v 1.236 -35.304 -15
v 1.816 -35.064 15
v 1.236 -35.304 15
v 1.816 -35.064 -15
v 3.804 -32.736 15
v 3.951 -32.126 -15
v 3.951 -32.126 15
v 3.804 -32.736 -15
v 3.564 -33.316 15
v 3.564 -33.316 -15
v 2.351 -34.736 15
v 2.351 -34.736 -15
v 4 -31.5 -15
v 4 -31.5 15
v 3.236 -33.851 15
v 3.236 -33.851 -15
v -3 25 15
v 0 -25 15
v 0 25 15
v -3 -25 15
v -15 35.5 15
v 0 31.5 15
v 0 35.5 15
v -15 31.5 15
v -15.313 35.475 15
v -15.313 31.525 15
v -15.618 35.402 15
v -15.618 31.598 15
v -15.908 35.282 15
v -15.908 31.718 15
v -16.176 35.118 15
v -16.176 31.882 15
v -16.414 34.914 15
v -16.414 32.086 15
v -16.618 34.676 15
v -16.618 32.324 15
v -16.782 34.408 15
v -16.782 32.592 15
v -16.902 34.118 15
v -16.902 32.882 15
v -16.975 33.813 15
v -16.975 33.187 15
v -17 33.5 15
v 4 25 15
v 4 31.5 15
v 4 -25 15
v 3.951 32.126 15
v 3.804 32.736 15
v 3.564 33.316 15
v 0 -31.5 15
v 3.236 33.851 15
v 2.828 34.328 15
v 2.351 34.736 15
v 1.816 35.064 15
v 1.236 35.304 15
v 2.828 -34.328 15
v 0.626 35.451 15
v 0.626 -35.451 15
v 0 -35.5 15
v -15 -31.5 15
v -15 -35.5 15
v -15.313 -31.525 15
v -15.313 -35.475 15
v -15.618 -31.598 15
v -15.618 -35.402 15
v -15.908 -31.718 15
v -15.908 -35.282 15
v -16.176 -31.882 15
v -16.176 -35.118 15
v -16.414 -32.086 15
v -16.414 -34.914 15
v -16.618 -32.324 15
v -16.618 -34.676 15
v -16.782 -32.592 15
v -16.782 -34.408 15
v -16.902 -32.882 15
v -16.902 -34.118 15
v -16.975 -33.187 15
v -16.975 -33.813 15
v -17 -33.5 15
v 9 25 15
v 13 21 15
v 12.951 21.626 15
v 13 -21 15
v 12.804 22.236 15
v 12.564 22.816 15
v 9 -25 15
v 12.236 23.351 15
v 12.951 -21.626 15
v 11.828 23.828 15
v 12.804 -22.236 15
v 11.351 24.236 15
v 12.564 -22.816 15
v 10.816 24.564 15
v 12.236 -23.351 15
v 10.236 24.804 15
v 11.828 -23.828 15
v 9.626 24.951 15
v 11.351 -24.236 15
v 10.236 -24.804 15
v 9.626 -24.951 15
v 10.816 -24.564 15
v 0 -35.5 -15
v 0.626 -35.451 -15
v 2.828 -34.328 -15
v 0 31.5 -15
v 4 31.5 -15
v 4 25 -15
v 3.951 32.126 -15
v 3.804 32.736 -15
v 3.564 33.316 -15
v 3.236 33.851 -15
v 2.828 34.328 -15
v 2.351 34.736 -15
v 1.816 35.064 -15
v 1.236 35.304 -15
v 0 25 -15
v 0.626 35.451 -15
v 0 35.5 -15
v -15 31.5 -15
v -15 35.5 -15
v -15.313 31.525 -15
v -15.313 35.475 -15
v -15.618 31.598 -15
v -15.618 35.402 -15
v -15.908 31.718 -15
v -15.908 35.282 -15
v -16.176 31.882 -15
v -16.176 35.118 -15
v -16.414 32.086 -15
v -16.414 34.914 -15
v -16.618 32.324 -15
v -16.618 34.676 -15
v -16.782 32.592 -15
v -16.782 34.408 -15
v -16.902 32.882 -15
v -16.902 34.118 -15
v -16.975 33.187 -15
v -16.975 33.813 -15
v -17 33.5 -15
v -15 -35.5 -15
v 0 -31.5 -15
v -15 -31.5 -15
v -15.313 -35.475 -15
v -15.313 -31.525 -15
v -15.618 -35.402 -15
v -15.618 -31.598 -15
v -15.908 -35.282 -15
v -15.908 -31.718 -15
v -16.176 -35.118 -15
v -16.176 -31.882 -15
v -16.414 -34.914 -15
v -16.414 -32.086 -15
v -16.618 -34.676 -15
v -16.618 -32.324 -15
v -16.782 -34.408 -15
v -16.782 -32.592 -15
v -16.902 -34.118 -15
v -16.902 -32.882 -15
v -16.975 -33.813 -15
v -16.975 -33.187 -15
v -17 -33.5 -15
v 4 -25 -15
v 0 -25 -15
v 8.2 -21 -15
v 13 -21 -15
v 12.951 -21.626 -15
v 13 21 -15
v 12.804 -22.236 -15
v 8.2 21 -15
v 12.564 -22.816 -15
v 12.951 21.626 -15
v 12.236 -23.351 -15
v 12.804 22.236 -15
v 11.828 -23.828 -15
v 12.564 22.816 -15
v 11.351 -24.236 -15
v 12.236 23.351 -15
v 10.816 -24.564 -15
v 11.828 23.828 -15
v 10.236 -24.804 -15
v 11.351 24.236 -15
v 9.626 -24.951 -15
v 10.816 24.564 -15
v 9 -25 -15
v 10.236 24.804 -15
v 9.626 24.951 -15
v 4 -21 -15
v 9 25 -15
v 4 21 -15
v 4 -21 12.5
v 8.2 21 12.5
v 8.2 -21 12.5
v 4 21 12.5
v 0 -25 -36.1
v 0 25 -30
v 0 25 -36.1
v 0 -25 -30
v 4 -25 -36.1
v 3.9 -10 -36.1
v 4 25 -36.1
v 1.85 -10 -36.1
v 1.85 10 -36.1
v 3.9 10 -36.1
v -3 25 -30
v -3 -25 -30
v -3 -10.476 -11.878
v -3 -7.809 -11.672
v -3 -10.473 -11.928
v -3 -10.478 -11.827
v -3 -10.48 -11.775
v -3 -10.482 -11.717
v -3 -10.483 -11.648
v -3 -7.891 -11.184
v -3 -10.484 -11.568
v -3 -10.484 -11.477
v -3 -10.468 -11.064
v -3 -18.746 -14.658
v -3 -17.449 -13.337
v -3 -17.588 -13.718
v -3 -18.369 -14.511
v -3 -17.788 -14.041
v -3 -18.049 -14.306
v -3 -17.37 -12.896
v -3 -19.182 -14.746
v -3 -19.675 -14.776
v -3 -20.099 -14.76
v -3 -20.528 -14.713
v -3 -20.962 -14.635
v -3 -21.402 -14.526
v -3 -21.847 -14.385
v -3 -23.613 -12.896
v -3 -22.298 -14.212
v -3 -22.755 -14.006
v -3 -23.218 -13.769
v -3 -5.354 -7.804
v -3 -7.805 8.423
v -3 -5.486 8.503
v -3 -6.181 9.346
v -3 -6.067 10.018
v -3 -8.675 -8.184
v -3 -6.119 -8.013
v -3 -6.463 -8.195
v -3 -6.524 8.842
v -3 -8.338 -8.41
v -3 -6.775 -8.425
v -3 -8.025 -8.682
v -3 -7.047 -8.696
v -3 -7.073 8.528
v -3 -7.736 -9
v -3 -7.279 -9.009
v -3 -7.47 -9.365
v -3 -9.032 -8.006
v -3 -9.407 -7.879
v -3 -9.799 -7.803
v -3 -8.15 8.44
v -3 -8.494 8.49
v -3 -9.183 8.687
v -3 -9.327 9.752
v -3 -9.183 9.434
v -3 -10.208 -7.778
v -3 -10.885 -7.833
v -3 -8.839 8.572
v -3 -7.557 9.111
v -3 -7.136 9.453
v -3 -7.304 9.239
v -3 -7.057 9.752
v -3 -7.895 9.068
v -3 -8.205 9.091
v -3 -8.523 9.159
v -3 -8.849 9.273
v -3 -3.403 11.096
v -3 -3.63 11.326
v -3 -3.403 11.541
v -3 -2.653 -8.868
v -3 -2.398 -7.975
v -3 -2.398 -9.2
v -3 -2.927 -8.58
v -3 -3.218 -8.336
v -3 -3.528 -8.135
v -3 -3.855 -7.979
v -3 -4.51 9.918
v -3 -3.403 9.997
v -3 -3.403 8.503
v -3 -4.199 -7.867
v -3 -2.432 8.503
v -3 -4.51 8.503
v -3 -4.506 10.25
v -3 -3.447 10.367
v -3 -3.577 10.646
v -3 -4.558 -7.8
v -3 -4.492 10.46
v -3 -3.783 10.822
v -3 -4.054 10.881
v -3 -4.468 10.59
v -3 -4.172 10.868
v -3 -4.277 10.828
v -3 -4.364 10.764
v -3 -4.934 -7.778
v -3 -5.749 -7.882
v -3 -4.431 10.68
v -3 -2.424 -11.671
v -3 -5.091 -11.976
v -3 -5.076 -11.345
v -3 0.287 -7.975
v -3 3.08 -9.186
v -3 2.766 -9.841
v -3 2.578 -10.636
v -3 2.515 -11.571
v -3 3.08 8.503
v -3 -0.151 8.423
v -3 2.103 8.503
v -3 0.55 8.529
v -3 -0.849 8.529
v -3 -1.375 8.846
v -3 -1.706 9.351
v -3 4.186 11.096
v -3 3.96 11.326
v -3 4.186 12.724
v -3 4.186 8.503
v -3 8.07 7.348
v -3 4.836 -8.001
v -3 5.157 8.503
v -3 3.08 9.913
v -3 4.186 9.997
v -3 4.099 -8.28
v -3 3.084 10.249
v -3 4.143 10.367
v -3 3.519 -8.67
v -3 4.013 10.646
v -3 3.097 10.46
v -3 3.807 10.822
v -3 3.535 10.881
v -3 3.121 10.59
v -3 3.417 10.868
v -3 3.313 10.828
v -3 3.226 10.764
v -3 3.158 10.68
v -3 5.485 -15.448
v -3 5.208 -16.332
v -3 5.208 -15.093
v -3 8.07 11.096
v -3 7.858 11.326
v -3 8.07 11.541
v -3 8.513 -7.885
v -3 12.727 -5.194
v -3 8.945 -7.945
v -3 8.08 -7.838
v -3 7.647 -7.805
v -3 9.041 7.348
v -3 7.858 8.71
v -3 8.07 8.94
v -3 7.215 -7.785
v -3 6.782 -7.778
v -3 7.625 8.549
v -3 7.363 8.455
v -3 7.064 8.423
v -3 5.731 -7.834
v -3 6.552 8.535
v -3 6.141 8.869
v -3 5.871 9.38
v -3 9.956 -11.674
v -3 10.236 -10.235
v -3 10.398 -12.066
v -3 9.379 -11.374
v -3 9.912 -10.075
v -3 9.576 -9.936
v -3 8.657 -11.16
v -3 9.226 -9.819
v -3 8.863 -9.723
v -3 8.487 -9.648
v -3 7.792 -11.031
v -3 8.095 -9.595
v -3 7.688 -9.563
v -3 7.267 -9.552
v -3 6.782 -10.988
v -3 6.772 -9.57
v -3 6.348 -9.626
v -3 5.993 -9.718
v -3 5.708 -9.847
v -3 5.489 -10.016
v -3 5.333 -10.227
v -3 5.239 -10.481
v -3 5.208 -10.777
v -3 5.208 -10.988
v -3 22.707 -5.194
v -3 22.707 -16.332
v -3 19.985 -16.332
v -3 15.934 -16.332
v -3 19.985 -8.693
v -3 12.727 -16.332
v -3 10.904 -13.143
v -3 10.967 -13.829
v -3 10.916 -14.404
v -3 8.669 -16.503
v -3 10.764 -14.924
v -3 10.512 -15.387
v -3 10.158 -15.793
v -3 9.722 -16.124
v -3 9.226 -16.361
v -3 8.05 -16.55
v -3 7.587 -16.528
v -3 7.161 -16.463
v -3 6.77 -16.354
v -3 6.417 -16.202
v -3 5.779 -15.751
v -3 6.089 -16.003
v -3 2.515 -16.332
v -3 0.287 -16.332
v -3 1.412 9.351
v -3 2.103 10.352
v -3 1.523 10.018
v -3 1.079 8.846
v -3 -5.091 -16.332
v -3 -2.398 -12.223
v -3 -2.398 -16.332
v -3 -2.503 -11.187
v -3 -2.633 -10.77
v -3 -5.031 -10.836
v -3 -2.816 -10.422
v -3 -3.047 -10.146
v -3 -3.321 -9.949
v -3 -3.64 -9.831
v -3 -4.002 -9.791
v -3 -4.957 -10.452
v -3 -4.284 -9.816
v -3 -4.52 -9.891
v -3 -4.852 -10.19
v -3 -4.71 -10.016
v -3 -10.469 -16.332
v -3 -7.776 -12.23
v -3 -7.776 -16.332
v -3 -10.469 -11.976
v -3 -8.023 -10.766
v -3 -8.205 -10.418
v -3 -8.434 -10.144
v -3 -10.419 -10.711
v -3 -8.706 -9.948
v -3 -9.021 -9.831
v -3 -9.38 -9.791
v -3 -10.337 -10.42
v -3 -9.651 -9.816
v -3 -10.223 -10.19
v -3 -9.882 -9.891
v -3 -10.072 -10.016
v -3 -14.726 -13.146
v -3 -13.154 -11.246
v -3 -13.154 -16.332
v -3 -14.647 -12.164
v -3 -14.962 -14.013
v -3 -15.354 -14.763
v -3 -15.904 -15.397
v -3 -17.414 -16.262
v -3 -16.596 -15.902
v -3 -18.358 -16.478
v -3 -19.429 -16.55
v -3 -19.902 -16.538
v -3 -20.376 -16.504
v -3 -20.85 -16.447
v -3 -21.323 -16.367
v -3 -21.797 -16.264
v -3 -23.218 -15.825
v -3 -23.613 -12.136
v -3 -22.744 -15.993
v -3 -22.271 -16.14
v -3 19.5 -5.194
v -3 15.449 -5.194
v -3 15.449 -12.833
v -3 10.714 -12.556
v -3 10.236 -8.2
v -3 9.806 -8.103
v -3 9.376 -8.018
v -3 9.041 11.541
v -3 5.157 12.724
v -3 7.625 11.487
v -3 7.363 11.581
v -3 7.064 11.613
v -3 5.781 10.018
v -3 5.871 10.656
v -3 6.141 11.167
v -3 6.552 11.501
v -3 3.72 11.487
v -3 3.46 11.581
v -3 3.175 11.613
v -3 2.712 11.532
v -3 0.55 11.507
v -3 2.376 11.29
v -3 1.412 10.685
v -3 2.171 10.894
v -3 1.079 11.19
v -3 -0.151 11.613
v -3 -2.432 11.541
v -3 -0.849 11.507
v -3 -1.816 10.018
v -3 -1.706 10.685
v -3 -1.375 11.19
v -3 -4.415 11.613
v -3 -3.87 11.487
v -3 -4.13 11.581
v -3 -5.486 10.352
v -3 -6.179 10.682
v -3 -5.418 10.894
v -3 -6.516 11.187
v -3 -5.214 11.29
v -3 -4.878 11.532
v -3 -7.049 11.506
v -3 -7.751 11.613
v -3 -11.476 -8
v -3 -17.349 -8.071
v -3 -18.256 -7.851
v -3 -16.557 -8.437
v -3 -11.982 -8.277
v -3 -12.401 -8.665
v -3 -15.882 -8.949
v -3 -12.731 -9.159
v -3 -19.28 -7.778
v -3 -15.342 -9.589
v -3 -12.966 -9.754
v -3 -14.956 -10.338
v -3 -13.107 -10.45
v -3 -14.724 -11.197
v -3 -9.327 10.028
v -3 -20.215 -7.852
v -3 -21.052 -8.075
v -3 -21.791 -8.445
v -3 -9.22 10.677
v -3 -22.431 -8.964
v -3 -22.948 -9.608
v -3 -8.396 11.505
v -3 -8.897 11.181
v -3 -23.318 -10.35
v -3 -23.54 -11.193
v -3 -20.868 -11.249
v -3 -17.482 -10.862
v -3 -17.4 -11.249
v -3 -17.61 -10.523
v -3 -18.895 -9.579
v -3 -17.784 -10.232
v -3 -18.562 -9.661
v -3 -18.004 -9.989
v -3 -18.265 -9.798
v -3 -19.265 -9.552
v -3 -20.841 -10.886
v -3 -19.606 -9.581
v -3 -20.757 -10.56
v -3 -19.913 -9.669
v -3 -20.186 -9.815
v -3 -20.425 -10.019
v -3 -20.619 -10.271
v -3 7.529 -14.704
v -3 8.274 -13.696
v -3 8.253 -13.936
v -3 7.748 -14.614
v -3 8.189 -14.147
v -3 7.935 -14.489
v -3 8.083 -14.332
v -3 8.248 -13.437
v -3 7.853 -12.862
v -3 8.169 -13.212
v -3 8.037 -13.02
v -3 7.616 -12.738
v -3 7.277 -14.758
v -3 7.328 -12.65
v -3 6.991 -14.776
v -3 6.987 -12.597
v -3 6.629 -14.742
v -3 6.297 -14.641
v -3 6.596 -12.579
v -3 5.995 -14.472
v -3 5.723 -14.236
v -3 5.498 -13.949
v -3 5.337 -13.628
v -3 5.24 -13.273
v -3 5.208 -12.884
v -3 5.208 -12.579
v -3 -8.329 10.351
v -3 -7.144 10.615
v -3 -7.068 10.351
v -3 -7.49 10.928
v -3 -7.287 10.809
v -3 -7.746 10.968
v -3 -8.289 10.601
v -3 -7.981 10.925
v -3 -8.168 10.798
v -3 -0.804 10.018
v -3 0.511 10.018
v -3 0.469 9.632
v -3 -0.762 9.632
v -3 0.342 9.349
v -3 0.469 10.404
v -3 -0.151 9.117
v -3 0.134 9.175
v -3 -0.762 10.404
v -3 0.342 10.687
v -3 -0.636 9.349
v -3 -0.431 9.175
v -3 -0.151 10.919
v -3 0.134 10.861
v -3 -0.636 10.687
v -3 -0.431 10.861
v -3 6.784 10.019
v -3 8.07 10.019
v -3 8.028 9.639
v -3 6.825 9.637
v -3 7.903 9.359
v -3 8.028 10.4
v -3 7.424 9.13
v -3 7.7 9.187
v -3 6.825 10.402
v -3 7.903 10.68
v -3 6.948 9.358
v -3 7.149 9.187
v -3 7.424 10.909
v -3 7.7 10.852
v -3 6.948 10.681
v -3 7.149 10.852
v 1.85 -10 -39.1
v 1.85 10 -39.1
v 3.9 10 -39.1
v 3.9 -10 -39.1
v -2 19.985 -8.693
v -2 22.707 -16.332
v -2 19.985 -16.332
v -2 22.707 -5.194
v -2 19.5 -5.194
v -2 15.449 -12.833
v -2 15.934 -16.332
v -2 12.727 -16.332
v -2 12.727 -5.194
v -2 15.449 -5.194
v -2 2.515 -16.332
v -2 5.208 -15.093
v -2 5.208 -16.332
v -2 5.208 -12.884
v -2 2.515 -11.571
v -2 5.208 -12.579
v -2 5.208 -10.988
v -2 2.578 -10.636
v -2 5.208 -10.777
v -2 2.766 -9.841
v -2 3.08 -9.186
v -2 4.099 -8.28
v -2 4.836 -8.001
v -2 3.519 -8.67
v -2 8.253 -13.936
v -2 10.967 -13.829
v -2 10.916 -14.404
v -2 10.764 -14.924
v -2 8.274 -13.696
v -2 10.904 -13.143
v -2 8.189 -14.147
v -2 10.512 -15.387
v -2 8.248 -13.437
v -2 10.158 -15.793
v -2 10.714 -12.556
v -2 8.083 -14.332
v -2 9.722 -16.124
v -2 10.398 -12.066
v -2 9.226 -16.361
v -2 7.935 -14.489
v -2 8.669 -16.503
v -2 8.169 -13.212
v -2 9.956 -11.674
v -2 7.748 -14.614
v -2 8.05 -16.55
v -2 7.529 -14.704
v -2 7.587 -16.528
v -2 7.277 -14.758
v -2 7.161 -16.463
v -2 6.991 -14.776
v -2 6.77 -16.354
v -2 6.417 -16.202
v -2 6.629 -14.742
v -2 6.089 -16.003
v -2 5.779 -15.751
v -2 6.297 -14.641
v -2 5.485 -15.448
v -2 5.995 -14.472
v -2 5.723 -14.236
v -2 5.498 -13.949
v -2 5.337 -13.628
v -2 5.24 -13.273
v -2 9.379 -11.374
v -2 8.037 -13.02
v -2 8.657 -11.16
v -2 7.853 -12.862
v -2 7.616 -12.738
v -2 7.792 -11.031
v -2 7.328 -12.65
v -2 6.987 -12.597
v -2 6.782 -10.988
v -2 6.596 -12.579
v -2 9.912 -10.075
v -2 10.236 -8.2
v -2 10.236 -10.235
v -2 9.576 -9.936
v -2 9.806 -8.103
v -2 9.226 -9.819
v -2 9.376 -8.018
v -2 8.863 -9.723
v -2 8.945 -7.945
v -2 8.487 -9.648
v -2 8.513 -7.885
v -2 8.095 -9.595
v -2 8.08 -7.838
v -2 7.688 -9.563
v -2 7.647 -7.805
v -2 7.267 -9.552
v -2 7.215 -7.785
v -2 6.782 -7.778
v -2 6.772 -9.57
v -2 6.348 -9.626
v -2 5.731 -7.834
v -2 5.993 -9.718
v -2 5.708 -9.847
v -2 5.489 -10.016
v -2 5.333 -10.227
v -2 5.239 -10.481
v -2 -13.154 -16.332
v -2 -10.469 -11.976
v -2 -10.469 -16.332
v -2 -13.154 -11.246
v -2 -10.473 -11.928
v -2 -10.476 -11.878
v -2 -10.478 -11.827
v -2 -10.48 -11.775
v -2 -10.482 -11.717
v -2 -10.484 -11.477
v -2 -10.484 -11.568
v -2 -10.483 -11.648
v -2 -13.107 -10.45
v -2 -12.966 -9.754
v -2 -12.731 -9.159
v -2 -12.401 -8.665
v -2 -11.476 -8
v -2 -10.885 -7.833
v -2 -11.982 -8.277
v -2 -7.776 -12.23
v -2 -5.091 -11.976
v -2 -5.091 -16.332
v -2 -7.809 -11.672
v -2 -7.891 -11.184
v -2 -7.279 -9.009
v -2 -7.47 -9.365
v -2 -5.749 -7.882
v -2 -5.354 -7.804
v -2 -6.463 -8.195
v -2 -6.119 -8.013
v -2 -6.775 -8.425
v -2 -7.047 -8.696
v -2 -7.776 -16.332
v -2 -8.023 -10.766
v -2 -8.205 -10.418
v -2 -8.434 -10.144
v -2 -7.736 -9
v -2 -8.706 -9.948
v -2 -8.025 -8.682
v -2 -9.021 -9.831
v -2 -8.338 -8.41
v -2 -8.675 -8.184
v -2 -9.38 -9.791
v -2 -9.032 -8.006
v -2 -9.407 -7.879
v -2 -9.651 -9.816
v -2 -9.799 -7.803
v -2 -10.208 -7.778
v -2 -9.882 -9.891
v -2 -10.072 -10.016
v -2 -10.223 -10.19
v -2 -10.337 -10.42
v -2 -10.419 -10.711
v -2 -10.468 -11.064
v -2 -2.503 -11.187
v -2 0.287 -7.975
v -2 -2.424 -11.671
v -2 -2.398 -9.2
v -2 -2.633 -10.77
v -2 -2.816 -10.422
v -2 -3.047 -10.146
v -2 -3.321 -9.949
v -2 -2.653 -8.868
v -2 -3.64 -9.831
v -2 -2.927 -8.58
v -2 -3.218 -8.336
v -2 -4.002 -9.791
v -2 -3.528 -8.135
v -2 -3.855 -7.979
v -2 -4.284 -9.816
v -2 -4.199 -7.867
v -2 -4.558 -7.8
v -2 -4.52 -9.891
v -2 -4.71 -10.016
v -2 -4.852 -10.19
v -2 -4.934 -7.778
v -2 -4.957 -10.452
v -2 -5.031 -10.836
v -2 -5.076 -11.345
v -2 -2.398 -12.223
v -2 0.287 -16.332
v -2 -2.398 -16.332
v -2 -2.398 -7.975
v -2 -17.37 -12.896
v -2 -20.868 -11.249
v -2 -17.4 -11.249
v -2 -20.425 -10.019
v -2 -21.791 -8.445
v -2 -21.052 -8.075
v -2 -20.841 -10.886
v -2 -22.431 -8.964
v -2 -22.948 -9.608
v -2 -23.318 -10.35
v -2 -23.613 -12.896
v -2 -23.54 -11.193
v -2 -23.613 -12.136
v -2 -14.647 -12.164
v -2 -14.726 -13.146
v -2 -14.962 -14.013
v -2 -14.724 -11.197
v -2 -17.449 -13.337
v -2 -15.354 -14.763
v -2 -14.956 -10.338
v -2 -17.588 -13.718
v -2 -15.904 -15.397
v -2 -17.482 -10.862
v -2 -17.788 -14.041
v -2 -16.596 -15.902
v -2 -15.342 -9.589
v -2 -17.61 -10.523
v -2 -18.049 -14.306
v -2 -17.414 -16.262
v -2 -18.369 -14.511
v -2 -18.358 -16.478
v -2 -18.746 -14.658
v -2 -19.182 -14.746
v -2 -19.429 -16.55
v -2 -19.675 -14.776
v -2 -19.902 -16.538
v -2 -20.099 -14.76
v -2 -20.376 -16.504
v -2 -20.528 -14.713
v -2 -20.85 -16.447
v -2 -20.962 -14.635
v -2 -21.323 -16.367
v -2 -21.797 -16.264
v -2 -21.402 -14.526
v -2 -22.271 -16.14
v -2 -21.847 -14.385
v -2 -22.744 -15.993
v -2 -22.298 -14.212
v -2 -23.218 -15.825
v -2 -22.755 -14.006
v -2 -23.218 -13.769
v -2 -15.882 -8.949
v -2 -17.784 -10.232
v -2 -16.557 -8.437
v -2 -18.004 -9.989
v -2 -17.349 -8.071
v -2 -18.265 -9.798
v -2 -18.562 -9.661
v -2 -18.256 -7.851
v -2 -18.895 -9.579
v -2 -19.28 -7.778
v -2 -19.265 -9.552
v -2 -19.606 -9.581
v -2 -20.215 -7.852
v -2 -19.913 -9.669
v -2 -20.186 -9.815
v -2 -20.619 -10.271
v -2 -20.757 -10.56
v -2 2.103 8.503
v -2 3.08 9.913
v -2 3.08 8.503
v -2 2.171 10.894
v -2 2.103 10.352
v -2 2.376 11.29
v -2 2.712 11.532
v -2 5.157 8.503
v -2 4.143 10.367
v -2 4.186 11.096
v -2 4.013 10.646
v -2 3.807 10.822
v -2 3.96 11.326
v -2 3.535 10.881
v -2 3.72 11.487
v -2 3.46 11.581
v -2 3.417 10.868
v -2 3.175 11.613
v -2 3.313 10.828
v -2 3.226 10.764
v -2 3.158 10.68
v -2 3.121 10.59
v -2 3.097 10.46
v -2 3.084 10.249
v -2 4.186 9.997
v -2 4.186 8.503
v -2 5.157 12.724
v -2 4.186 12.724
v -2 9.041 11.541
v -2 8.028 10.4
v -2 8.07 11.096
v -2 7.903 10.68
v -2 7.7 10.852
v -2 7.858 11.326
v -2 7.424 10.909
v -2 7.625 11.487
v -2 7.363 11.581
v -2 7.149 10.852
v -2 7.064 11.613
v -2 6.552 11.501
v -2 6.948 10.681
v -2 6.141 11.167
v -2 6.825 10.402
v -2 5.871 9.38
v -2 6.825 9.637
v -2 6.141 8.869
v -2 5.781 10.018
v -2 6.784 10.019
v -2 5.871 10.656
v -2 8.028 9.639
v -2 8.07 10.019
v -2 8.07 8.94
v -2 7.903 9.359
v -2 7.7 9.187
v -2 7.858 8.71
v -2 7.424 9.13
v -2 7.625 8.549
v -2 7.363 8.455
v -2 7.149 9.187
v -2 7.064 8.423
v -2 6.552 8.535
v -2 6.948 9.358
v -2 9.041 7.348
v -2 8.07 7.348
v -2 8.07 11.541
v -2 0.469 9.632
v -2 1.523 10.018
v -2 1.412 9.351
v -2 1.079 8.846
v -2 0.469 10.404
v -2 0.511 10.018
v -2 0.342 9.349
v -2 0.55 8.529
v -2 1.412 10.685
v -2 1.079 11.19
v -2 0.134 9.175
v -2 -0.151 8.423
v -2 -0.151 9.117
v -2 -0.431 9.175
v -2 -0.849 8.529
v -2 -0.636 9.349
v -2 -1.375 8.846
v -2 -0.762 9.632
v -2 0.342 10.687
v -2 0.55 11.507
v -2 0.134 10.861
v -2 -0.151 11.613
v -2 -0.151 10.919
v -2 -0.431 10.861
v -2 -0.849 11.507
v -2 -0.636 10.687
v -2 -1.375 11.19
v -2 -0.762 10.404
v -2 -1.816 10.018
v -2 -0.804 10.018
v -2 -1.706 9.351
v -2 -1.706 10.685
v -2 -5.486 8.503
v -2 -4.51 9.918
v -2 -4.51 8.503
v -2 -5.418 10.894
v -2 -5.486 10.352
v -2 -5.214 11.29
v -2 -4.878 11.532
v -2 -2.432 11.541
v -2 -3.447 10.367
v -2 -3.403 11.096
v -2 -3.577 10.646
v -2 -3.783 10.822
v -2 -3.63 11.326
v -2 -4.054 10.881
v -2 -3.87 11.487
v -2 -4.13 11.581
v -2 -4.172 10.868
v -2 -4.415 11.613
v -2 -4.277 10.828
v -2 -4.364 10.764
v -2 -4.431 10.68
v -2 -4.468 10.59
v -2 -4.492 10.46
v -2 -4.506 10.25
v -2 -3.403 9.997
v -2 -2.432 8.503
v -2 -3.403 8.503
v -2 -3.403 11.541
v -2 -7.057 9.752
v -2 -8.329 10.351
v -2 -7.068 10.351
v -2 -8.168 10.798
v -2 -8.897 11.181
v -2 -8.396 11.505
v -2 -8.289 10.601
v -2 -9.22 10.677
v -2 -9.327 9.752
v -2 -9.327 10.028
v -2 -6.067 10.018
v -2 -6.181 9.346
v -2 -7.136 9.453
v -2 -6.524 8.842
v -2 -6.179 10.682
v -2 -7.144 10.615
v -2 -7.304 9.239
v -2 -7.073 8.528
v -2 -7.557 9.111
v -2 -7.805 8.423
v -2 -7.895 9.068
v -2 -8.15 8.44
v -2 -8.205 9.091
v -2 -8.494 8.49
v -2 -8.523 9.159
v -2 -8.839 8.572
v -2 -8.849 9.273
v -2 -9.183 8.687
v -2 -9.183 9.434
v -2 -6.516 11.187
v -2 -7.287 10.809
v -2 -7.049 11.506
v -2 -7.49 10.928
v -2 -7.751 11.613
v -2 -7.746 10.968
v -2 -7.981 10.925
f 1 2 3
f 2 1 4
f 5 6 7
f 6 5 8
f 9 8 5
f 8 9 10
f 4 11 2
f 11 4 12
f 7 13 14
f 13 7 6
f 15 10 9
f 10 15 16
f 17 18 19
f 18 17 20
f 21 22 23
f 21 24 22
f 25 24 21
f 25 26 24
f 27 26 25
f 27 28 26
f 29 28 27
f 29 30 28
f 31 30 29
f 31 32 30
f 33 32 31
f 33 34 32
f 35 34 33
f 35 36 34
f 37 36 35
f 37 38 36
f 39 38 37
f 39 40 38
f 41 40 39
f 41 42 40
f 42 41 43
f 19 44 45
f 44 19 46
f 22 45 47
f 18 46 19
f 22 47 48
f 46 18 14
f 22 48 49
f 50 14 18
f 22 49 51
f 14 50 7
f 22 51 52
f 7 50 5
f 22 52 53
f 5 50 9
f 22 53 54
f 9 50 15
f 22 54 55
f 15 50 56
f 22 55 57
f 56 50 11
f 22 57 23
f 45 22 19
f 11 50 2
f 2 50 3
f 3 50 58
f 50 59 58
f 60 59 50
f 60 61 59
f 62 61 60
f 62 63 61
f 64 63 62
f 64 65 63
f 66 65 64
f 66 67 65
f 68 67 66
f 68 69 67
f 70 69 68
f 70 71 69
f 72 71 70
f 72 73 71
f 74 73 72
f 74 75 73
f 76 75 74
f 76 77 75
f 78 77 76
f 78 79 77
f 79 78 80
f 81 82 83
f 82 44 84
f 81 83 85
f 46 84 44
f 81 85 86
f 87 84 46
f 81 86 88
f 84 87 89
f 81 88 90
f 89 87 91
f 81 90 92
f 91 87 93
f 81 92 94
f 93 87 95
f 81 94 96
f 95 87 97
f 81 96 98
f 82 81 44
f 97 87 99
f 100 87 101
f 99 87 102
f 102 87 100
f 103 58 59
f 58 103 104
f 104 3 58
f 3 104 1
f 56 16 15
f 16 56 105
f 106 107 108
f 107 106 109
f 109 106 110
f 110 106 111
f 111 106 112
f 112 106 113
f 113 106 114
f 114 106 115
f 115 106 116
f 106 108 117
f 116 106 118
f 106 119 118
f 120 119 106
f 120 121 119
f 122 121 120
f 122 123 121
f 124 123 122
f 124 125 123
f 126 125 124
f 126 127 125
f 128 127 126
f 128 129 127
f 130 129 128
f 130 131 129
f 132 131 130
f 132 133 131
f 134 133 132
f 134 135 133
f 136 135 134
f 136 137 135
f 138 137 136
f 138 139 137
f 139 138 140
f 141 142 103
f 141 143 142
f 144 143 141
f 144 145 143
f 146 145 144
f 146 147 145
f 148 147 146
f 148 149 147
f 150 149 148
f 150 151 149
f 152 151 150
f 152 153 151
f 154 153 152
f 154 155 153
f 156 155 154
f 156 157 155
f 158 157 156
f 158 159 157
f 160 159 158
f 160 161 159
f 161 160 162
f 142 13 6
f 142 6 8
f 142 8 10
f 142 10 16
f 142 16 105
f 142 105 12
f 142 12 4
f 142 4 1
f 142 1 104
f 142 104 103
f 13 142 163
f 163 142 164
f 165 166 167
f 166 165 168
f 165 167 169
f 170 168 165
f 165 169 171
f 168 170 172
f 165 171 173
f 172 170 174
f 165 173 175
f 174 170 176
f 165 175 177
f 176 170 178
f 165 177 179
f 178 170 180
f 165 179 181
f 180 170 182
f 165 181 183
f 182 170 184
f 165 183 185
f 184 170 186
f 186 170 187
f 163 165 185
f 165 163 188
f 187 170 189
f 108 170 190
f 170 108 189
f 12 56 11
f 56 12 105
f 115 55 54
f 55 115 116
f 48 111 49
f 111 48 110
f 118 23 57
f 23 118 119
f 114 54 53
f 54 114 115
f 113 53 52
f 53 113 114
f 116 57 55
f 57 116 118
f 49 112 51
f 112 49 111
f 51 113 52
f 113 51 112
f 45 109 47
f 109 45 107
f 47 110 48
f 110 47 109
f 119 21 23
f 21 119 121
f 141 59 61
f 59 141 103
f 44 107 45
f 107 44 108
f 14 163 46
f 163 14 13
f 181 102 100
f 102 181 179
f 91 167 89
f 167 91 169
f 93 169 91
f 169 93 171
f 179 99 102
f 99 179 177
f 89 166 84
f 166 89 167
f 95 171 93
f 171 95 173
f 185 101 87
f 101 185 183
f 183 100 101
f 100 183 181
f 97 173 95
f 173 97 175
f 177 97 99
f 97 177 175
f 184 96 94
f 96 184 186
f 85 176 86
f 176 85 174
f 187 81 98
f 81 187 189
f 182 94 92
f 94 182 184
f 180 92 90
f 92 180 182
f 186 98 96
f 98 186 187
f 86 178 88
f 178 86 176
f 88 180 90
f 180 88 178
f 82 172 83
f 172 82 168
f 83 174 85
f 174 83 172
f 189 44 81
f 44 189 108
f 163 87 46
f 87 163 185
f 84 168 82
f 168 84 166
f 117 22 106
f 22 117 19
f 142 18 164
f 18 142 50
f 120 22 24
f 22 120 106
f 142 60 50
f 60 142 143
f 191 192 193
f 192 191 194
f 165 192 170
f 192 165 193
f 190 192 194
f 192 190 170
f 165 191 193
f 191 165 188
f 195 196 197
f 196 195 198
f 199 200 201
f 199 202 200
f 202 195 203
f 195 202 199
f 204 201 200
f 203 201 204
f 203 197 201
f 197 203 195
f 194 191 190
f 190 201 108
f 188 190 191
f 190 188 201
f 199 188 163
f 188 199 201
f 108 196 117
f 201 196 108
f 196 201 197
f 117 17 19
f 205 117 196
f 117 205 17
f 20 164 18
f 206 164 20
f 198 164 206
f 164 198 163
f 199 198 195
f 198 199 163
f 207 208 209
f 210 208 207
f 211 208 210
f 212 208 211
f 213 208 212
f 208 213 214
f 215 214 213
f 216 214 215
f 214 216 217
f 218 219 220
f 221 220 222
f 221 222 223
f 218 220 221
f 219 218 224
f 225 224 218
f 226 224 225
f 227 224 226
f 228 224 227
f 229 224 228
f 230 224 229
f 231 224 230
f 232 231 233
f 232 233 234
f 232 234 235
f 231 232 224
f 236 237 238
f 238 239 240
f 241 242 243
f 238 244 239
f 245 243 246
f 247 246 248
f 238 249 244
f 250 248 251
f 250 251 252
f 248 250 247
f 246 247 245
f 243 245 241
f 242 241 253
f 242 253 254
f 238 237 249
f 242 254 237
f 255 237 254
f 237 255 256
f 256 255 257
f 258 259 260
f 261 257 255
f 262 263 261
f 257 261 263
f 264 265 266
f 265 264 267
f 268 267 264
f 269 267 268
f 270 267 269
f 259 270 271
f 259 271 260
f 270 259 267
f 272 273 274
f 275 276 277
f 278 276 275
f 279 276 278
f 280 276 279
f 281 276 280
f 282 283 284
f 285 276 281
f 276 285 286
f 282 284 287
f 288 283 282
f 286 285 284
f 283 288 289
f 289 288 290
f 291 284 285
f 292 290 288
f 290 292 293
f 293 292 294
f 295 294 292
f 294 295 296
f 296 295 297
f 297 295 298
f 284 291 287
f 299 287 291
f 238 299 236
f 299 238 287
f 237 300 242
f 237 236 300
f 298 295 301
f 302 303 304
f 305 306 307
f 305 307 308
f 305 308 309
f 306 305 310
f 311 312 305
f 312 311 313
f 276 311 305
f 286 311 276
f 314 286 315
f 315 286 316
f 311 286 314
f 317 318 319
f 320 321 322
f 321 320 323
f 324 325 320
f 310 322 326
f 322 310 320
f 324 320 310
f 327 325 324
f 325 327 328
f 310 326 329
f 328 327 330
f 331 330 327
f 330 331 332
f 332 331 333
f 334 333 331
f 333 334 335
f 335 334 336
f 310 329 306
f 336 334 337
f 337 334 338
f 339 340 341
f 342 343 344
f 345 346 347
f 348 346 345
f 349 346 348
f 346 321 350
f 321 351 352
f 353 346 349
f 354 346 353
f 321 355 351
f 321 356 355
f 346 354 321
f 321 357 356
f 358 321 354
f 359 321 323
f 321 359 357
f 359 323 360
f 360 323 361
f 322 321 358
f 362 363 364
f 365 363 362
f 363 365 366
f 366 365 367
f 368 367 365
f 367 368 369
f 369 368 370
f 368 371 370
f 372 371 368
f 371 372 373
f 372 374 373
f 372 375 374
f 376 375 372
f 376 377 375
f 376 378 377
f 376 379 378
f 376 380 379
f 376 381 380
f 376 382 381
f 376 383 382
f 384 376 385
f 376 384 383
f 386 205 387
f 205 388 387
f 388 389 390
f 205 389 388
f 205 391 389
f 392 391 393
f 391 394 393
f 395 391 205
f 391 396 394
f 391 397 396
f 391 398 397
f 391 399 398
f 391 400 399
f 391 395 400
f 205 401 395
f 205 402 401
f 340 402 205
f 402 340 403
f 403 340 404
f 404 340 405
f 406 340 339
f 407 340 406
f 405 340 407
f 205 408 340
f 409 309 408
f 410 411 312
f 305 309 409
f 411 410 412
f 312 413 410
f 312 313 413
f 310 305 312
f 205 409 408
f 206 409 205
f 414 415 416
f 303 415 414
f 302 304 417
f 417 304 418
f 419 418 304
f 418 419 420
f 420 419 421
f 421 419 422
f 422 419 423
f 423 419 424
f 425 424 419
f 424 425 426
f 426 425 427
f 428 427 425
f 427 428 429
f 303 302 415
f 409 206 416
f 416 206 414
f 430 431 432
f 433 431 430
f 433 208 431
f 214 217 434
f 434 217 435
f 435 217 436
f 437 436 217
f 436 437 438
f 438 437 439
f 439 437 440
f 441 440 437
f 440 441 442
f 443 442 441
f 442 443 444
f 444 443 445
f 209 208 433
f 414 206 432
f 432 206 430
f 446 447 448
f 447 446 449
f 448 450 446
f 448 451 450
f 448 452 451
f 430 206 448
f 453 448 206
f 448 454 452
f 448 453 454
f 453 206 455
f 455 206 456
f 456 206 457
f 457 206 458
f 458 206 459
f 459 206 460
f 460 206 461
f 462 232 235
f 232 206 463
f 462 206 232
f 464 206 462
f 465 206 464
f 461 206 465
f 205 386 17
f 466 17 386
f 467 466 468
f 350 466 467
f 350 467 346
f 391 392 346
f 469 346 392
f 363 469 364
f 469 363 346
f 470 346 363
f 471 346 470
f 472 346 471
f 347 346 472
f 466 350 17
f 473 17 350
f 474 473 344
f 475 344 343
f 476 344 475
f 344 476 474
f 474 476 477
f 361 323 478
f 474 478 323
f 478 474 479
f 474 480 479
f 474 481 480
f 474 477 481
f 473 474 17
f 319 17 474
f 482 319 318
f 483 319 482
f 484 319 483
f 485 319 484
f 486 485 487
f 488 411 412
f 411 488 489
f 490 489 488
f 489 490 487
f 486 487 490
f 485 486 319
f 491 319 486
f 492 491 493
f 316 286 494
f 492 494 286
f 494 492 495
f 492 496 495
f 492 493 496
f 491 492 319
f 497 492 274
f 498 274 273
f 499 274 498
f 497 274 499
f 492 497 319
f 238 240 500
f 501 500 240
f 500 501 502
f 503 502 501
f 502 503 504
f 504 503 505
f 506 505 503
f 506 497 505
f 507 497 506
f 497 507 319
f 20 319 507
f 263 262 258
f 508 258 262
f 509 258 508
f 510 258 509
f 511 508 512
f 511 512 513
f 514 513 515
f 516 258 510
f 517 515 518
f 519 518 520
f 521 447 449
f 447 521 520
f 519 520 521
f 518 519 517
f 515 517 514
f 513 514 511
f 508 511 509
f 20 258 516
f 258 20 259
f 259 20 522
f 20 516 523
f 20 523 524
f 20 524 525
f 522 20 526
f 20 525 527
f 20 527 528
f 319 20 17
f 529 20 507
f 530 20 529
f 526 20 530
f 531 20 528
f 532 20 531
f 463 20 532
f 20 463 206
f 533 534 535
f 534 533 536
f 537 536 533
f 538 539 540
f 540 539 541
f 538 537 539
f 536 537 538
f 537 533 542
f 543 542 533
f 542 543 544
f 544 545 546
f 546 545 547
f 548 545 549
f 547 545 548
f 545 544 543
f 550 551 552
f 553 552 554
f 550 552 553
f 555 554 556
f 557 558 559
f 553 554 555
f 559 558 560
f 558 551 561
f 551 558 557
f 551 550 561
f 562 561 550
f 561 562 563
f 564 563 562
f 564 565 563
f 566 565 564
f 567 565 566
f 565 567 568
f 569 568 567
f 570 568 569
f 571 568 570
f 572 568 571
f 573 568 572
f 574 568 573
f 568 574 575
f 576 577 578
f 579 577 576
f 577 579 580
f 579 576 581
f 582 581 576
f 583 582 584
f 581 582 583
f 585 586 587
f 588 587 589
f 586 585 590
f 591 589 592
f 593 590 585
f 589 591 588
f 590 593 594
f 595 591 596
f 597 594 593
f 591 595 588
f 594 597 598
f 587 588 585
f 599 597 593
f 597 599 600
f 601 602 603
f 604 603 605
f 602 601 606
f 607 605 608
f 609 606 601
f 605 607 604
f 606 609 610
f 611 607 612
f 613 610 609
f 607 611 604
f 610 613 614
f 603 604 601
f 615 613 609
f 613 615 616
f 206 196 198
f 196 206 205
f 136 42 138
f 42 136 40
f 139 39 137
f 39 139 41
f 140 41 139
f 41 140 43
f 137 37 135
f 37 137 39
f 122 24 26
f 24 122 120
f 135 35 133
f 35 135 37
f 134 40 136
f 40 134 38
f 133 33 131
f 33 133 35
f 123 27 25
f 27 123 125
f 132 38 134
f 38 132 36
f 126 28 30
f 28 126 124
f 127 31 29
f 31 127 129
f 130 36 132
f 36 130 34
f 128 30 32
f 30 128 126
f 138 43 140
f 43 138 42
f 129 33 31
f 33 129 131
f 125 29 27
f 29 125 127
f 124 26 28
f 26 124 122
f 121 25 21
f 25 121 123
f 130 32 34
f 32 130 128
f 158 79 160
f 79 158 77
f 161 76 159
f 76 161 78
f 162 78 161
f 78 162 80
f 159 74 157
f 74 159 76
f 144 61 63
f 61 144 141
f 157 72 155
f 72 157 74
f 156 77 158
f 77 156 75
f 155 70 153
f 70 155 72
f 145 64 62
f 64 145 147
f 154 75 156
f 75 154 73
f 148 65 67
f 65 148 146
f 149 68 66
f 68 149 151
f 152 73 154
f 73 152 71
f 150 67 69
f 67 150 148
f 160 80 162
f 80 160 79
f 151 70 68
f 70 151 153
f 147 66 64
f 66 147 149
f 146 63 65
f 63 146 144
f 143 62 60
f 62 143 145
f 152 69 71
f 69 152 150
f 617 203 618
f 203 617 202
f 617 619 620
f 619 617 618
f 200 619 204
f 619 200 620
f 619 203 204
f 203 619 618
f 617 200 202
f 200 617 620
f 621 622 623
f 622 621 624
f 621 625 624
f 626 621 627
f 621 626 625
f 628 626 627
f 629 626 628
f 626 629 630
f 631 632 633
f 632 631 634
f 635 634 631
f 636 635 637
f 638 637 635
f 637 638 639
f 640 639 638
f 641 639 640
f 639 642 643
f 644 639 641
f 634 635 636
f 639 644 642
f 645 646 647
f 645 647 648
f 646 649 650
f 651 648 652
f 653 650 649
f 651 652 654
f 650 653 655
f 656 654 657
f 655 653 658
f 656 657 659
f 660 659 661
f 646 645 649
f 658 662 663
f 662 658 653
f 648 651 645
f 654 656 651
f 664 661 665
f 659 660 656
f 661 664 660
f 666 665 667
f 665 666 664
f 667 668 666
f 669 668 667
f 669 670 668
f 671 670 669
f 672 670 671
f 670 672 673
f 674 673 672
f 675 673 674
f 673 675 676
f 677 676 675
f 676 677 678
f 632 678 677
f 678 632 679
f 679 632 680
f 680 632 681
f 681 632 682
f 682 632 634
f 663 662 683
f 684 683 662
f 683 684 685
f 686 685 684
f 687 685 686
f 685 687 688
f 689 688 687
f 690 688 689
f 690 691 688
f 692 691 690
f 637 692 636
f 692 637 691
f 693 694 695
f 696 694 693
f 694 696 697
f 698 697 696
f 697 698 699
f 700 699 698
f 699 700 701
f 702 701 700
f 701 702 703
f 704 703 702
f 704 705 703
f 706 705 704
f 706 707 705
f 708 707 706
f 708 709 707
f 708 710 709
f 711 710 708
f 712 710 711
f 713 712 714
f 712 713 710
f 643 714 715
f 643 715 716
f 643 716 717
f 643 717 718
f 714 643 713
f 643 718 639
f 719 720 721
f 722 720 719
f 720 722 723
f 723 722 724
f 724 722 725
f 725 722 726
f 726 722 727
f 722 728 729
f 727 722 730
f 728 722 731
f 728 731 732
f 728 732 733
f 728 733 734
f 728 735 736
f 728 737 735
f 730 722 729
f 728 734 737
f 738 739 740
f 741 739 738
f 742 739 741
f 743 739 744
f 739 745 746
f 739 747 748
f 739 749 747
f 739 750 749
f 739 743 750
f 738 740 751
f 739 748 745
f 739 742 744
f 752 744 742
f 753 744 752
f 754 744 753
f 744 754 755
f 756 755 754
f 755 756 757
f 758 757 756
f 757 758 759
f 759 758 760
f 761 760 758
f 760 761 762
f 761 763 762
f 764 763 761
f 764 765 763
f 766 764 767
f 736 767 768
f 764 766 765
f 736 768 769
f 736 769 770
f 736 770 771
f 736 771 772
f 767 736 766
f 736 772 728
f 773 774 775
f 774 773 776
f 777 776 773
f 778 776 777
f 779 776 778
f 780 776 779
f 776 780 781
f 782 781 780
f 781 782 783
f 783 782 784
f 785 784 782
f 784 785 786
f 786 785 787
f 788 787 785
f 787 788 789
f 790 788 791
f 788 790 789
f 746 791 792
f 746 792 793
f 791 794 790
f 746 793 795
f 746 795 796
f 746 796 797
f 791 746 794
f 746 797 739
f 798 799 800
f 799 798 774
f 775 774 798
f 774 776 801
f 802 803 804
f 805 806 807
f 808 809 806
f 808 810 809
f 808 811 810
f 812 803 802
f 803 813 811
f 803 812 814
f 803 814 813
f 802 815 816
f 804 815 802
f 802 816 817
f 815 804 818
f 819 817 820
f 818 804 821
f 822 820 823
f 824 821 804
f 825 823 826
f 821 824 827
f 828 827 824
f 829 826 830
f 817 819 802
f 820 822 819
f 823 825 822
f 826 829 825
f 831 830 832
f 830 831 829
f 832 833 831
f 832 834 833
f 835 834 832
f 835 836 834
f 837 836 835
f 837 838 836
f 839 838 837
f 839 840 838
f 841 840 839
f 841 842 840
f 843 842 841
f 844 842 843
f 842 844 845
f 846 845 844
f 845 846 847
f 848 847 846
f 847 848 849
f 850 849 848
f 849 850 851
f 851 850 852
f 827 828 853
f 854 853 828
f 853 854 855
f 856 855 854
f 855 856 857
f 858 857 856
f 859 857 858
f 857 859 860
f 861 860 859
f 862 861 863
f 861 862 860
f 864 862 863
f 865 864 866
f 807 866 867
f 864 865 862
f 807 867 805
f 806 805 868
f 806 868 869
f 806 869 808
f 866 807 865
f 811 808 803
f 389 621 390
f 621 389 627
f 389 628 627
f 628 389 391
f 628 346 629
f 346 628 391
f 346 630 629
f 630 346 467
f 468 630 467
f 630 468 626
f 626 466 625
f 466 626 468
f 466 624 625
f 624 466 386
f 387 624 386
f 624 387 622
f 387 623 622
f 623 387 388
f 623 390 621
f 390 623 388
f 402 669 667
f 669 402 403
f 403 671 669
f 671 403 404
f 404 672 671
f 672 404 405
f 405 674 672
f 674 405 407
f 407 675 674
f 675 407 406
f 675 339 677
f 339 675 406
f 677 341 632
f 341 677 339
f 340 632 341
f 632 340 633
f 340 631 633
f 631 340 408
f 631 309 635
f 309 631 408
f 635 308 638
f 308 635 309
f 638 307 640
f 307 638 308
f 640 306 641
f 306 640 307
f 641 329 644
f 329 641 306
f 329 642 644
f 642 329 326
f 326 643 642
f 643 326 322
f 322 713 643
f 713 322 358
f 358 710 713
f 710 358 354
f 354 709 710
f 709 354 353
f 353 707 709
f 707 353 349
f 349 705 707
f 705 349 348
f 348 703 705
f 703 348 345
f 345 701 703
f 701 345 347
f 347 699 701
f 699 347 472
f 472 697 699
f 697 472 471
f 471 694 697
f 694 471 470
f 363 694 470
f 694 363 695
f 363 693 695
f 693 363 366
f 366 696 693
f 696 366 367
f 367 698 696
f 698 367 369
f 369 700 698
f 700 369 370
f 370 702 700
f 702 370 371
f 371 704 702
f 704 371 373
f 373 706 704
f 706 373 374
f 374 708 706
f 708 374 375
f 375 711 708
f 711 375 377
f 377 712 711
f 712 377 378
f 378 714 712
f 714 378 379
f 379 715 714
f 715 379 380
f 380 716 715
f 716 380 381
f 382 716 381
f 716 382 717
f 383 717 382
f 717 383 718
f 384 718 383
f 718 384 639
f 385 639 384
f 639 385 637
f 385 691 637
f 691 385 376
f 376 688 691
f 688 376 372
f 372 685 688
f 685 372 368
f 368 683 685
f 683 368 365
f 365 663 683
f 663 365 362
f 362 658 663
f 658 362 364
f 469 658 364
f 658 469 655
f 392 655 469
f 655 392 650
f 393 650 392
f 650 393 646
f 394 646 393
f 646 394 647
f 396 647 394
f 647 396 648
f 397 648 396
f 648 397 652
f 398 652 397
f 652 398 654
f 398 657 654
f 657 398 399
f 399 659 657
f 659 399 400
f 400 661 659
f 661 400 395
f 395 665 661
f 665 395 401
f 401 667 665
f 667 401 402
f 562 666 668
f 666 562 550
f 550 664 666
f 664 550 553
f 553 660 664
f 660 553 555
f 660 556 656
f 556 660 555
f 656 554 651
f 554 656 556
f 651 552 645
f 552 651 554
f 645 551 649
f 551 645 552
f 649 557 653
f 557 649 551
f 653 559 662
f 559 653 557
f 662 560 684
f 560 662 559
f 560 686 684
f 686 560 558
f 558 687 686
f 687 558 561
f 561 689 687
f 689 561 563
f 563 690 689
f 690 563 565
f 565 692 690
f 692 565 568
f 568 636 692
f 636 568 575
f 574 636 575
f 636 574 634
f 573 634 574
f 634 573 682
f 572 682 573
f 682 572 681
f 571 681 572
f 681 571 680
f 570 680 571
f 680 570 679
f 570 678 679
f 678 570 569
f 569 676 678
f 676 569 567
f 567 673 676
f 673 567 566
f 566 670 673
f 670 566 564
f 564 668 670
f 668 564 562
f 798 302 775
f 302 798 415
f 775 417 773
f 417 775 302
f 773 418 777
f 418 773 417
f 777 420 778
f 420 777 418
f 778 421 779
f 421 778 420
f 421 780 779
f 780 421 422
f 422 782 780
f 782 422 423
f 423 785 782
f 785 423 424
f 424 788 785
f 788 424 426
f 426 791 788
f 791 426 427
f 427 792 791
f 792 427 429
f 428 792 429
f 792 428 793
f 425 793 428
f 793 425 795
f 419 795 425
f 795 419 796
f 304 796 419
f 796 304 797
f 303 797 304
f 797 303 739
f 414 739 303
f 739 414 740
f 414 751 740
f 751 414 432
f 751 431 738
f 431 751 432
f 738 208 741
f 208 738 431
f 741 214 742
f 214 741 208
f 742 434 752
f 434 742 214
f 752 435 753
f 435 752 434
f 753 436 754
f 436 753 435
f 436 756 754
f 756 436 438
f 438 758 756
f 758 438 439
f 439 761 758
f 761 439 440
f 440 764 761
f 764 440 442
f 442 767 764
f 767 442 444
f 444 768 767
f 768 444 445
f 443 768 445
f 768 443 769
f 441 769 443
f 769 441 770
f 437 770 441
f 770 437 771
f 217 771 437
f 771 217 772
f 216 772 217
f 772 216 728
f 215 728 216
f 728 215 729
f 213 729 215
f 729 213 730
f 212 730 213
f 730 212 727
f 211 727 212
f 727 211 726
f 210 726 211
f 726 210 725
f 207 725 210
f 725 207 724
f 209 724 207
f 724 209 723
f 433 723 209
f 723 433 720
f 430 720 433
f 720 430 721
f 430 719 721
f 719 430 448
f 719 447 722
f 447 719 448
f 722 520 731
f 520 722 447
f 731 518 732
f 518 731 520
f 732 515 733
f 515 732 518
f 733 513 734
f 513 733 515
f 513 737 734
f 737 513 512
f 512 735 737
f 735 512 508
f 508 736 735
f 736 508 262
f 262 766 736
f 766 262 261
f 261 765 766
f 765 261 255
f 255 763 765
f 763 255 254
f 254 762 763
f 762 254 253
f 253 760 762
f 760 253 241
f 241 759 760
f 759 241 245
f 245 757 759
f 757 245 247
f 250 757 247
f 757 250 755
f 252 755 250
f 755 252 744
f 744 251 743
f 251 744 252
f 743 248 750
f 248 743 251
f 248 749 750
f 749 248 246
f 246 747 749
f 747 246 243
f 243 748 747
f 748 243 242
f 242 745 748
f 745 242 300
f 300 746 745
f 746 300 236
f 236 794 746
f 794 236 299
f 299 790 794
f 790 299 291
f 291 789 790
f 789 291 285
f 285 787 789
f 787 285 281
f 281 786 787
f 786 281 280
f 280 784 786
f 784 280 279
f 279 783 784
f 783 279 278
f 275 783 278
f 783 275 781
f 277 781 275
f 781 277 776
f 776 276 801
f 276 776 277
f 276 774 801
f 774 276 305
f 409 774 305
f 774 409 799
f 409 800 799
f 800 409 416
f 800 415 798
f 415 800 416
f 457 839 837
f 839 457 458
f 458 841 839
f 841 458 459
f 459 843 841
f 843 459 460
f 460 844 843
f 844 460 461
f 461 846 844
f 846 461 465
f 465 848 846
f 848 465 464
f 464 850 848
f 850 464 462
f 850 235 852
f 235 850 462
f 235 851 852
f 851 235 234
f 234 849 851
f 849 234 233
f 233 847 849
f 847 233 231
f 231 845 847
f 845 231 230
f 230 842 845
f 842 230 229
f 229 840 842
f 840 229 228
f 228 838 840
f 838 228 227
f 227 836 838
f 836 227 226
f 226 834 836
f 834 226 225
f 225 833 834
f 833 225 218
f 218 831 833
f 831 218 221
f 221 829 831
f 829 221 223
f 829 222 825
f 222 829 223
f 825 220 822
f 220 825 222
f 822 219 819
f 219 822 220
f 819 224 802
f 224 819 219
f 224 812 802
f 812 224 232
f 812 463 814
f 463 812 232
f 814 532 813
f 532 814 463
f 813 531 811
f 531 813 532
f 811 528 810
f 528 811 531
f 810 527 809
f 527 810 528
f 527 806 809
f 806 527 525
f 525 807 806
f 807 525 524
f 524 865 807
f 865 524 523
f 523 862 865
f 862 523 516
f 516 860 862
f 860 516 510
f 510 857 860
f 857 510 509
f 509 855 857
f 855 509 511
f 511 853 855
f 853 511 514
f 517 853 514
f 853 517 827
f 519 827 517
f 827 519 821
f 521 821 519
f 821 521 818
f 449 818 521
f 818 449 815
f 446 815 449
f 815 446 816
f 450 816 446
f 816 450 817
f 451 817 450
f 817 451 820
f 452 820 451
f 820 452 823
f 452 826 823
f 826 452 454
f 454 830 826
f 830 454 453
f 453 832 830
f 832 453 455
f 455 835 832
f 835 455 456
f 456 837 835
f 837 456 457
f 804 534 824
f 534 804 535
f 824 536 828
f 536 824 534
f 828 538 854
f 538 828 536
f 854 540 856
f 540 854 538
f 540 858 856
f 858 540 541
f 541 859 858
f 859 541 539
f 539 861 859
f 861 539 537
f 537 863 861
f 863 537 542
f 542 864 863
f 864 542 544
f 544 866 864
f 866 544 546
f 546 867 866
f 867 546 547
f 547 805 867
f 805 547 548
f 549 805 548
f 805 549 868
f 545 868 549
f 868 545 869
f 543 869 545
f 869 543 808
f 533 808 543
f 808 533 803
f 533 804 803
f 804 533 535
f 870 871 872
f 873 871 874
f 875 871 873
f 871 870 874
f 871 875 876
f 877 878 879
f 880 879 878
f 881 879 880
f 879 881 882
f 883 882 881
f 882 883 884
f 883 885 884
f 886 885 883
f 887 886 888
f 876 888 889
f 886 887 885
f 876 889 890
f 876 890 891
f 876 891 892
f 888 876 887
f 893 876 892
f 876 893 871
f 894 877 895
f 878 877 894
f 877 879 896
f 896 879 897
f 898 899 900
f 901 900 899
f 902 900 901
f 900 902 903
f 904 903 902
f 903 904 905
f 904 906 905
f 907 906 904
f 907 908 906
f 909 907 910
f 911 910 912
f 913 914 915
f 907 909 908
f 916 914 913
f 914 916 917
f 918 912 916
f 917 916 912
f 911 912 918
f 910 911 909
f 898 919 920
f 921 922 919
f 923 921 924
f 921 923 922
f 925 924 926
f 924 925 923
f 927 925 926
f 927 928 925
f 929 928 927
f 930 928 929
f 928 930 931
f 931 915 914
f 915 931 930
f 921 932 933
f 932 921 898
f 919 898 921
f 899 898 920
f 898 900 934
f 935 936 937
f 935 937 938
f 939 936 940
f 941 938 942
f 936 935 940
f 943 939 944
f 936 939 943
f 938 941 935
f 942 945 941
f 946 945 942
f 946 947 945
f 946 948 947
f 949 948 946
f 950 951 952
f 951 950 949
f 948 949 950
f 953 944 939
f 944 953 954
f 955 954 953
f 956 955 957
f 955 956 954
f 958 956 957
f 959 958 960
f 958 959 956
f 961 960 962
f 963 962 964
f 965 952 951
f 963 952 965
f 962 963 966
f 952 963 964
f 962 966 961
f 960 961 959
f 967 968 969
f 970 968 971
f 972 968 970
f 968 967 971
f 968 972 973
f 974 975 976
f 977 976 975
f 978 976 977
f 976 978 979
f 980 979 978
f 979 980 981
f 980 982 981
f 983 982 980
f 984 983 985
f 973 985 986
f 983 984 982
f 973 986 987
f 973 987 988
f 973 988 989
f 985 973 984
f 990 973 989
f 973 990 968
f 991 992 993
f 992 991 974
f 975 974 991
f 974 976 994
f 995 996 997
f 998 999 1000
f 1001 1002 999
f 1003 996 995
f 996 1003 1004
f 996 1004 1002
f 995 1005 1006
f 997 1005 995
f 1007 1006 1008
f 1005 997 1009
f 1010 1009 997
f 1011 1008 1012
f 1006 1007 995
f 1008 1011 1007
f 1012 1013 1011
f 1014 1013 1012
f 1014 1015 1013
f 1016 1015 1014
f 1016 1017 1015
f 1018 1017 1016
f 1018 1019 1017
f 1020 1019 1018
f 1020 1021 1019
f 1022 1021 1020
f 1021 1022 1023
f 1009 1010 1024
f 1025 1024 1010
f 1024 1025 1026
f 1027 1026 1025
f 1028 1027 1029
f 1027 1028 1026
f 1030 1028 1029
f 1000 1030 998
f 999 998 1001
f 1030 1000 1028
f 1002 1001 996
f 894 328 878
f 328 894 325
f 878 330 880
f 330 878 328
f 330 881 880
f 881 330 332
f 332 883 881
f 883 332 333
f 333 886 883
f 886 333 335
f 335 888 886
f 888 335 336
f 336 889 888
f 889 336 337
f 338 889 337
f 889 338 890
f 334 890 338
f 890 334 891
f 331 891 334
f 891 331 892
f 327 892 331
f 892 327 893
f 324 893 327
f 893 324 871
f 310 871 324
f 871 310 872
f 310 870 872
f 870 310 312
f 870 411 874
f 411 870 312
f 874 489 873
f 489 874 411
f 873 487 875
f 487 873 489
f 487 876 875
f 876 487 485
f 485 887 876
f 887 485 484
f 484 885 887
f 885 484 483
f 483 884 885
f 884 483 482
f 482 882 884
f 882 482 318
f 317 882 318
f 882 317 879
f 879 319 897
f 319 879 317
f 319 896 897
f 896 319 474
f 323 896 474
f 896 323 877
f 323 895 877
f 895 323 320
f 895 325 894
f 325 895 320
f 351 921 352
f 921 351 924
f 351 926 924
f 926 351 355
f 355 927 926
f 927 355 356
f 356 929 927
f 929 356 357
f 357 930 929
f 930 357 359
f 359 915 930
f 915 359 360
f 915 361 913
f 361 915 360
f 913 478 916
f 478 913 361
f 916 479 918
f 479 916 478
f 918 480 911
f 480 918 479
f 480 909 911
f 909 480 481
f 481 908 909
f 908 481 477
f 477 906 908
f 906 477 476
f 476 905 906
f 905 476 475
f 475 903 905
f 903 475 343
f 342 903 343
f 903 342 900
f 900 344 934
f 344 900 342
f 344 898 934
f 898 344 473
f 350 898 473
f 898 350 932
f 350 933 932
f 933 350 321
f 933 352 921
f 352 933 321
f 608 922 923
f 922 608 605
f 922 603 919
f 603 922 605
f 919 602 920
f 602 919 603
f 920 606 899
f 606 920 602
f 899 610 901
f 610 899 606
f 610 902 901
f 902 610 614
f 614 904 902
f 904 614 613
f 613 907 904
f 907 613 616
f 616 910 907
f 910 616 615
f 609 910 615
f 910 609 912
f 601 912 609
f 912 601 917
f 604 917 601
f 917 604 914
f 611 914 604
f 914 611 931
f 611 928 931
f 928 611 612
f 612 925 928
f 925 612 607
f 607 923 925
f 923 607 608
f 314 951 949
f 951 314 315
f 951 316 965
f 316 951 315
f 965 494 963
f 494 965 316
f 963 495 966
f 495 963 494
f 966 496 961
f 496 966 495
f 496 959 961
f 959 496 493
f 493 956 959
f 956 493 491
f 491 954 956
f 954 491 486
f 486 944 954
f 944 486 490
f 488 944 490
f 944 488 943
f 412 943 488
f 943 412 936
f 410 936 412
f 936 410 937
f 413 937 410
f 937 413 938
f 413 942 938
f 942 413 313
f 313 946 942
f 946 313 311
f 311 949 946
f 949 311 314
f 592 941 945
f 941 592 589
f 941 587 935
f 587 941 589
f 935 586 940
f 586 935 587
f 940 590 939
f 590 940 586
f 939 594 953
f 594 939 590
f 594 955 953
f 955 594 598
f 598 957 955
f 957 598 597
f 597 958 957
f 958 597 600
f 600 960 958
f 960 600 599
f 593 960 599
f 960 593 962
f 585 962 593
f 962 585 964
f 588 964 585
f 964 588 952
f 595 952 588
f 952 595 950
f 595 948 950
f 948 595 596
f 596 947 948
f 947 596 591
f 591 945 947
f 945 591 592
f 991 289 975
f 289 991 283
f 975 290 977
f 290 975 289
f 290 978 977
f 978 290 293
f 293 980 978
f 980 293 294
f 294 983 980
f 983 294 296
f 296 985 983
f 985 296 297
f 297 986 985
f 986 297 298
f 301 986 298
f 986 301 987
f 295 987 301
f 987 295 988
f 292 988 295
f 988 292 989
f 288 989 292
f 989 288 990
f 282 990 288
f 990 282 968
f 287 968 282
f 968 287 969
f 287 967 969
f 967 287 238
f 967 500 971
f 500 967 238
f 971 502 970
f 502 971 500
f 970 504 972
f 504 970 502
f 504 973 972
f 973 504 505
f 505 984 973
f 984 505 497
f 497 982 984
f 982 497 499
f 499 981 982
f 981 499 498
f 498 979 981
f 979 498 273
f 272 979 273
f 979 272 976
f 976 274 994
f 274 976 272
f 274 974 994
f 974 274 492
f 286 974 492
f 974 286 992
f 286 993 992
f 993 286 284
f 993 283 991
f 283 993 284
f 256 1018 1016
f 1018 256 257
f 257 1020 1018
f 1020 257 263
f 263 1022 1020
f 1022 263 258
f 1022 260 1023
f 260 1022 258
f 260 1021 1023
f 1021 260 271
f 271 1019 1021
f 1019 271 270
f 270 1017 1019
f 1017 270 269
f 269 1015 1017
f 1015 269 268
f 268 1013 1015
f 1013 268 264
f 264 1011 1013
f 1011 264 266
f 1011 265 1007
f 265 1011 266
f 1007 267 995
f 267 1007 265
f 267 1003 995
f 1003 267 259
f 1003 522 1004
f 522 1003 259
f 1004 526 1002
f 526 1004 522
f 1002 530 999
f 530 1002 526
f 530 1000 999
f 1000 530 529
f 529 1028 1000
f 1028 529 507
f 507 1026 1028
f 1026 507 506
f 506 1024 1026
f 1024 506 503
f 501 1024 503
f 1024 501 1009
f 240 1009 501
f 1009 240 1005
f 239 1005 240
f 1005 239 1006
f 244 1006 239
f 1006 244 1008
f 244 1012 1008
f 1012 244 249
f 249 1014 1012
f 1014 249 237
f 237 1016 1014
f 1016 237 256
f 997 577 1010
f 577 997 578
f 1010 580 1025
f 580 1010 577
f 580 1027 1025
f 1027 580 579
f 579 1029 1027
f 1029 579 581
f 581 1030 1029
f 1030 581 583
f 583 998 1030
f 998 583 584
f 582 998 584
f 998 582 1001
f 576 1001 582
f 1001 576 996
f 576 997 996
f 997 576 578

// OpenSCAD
// preview[view:south west, tilt:top diagonal]
include <MCAD/boxes.scad>  // Include Boxes library to get easy rounded boxes

/* [Top holder spec] */
// Which one would you like to see?
part = "first"; // [first:Top holder,second:Connector]

// Text line 1, example: Phone model name
phone_name = "phone";

// Font size for text line 2, "TextLabel"
font_size = 11; // [3:29]

// Text line 2, example: Your own name 
TextLabel = "Name";
font = "REGISTRATION PLATE UK:style=Bold";

// The width of your phone including any cover you have on it (in mm)
phone_width = 63; // [50:150]

// The length from the back of the connector to the back of the phone (in mm)
phone_depth = 4; // [0:0.1:7]

// Add extra support on the side holders?
support = 0; // [1:Yes,0:No]

// Only needed if you have extra support: The total depth/thickness of your phone (in mm)
phone_thickness = 12; // [2:0.1:16]


/* [Connector adapter spec] */
// The width of the connector (in mm)
connector_width = 11.1; // [0:0.1:32]

// The depth of the connector (in mm)
connector_depth = 6.2; // [0:0.1:14]

// The height of the connector (in mm)
connector_height = 17; // [0:0.1:29]

// Advanced: Offset of the connector (experimental) (in mm)
offset = 0; // [-10:0.1:10]

// Advanced: Add 10 mm to the phone depth (experimental)
extraD = 0; // [1:Yes,0:No]

print_part();

module print_part() {
	if (part == "first") {
		topholder();
	} else if (part == "second") {
		connector();
	} else {
		topholder();
	}
}

module topholder() {

rotate([180,0,180]) {
// Difference will construct a main shape and subtract cut outs
difference() {
    
  // Main Shape
  union(){
    translate([((phone_thickness+extraD*10+11-phone_depth)/2)-2,0,0]) {
    roundedBox([phone_thickness+extraD*10+11-phone_depth+4, phone_width+8, 30], 4, true, $fn=40);
    }
    roundedBox([26, 50, 30], 4, true, $fn=40);
  } // End union
  
  // Cut outs
  translate([20,0,0]) {
    cube([40,phone_width,32],true);
    cube([42,49,32],true);   
    }
    translate([-6.1,0,5]) {
      cube([4.2,42,35],true);
    }
   
   if (support == 0) { 
    translate([phone_thickness+extraD*10+11-phone_depth-2,0,0]) {    
      cube([4, 300, 32], true);
    }
    }
   
  } // End difference
    
// Add ons
  
difference() {
  union(){
    translate([-4,-25,-15]) {
      cube([4,50,51.1],false);
      cube([11-phone_depth,50,45],false);
    }

    translate([-3.9,-10,-15]) {
      cube([2.05,20,54.1],false);
    }
      
if (support == 0) {

    translate([((phone_thickness+extraD*10+11-phone_depth))-4,phone_width/2+2,0]) {    
      roundedBox([4, 4, 30], 2, true, $fn=40);
    }
    
    translate([((phone_thickness+extraD*10+11-phone_depth))-4,-phone_width/2-2,0]) {    
      roundedBox([4, 4, 30], 2, true, $fn=40);
    }
    
    }



if (support == 1) {

    translate([((phone_thickness+extraD*10+11-phone_depth))-2,phone_width/2-1,0]) {    
      roundedBox([4, 5.5, 30], 2, true, $fn=40);
    }
    
    translate([((phone_thickness+extraD*10+11-phone_depth))-2,-phone_width/2+1,0]) {    
      roundedBox([4, 5.5, 30], 2, true, $fn=40);
    }
    
    }
    
  } // End union
  
  // Cut out text
   translate([6-phone_depth,0,11]) {
    rotate([90,180,90]) {
      linear_extrude(height = 1.5) {
        text(text = str(TextLabel), font = font, size = font_size, valign = "center", halign = "center");
      }
    }
    }
    
     translate([6-phone_depth,0,-10]) {
    rotate([90,180,90]) {
      linear_extrude(height = 1.5) {
        text(text = str(phone_name), font = font, size = 4, valign = "center", halign = "center");
      }
    }
    }
} // End difference

}
}


module connector() {

if (extraD == 0) {
rotate([0,10,180]) {
  translate([-40,0,-0.5]) {
// Difference will construct a main shape and subtract cut outs
difference() {
    
  // Main Shape
  union(){
    translate([0,0,0]) {
    roundedBox([16, 37.8, 31], 2, true, $fn=40);
    }
    translate([0,-18.9,-15.5]) {
      cube([8, 37.8, 31], false);
    }
  } // End union
  
  // Cut outs
  translate([-2.15,17,-5.8]) {
    cube([4.3,2.10,21.34],false);   
  }
  
  translate([-2.15,-17-2.10,-5.8]) {
    cube([4.3,2.10,21.34],false);
  }
  
  translate([0,offset,0]) {
    cylinder( 35,3,3, true, $fn=30);
  }
  
  translate([0,-2.75+offset,-18]) {
    cube([10,5.5,35],false);
  }
  
  rotate([0,-10,0]) {
    translate([-15,-20,-18.6]) {
      cube([25,40,5],false);
    }
  }
  
  // Customized hole
  translate([-connector_depth/2,-connector_width/2+offset,15.6-(connector_height-1)]) {
    cube([connector_depth,connector_width,connector_height-1],false);
  }
  
  } // End difference
    
}
}
}

if (extraD == 1) {
rotate([0,10,180]) {
  translate([-40,0,-0.5]) {
// Difference will construct a main shape and subtract cut outs
difference() {
    
  // Main Shape
  union(){
    translate([-8,0,-2]) {
    roundedBox([20, 37.8, 35], 2, true, $fn=40);
    }
    translate([0,-18.9,-15.5]) {
      cube([8, 37.8, 31], false);
    }
  } // End union
  
  // Cut outs
  translate([-2.15,17,-5.8]) {
    cube([4.3,2.10,21.34],false);   
  }
  
  translate([-2.15,-17-2.10,-5.8]) {
    cube([4.3,2.10,21.34],false);
  }
  
  translate([-10,-2.75+offset,-18]) {
    cube([20,5.5,35],false);
  }
  
  union(){
      translate([-10,0,0]) {
  translate([0,offset,0]) {
    cylinder( 35,3,3, true, $fn=30);
  }
  
  rotate([0,-10,0]) {
    translate([-35,-20,-23.6]) {
      cube([55,40,10],false);
    }
  }
  
  // Customized hole
  translate([-connector_depth/2,-connector_width/2+offset,15.6-(connector_height-1)]) {
    cube([connector_depth,connector_width,connector_height-1],false);
  }
  }
  }
  
  } // End difference
    
}
}
}


}
